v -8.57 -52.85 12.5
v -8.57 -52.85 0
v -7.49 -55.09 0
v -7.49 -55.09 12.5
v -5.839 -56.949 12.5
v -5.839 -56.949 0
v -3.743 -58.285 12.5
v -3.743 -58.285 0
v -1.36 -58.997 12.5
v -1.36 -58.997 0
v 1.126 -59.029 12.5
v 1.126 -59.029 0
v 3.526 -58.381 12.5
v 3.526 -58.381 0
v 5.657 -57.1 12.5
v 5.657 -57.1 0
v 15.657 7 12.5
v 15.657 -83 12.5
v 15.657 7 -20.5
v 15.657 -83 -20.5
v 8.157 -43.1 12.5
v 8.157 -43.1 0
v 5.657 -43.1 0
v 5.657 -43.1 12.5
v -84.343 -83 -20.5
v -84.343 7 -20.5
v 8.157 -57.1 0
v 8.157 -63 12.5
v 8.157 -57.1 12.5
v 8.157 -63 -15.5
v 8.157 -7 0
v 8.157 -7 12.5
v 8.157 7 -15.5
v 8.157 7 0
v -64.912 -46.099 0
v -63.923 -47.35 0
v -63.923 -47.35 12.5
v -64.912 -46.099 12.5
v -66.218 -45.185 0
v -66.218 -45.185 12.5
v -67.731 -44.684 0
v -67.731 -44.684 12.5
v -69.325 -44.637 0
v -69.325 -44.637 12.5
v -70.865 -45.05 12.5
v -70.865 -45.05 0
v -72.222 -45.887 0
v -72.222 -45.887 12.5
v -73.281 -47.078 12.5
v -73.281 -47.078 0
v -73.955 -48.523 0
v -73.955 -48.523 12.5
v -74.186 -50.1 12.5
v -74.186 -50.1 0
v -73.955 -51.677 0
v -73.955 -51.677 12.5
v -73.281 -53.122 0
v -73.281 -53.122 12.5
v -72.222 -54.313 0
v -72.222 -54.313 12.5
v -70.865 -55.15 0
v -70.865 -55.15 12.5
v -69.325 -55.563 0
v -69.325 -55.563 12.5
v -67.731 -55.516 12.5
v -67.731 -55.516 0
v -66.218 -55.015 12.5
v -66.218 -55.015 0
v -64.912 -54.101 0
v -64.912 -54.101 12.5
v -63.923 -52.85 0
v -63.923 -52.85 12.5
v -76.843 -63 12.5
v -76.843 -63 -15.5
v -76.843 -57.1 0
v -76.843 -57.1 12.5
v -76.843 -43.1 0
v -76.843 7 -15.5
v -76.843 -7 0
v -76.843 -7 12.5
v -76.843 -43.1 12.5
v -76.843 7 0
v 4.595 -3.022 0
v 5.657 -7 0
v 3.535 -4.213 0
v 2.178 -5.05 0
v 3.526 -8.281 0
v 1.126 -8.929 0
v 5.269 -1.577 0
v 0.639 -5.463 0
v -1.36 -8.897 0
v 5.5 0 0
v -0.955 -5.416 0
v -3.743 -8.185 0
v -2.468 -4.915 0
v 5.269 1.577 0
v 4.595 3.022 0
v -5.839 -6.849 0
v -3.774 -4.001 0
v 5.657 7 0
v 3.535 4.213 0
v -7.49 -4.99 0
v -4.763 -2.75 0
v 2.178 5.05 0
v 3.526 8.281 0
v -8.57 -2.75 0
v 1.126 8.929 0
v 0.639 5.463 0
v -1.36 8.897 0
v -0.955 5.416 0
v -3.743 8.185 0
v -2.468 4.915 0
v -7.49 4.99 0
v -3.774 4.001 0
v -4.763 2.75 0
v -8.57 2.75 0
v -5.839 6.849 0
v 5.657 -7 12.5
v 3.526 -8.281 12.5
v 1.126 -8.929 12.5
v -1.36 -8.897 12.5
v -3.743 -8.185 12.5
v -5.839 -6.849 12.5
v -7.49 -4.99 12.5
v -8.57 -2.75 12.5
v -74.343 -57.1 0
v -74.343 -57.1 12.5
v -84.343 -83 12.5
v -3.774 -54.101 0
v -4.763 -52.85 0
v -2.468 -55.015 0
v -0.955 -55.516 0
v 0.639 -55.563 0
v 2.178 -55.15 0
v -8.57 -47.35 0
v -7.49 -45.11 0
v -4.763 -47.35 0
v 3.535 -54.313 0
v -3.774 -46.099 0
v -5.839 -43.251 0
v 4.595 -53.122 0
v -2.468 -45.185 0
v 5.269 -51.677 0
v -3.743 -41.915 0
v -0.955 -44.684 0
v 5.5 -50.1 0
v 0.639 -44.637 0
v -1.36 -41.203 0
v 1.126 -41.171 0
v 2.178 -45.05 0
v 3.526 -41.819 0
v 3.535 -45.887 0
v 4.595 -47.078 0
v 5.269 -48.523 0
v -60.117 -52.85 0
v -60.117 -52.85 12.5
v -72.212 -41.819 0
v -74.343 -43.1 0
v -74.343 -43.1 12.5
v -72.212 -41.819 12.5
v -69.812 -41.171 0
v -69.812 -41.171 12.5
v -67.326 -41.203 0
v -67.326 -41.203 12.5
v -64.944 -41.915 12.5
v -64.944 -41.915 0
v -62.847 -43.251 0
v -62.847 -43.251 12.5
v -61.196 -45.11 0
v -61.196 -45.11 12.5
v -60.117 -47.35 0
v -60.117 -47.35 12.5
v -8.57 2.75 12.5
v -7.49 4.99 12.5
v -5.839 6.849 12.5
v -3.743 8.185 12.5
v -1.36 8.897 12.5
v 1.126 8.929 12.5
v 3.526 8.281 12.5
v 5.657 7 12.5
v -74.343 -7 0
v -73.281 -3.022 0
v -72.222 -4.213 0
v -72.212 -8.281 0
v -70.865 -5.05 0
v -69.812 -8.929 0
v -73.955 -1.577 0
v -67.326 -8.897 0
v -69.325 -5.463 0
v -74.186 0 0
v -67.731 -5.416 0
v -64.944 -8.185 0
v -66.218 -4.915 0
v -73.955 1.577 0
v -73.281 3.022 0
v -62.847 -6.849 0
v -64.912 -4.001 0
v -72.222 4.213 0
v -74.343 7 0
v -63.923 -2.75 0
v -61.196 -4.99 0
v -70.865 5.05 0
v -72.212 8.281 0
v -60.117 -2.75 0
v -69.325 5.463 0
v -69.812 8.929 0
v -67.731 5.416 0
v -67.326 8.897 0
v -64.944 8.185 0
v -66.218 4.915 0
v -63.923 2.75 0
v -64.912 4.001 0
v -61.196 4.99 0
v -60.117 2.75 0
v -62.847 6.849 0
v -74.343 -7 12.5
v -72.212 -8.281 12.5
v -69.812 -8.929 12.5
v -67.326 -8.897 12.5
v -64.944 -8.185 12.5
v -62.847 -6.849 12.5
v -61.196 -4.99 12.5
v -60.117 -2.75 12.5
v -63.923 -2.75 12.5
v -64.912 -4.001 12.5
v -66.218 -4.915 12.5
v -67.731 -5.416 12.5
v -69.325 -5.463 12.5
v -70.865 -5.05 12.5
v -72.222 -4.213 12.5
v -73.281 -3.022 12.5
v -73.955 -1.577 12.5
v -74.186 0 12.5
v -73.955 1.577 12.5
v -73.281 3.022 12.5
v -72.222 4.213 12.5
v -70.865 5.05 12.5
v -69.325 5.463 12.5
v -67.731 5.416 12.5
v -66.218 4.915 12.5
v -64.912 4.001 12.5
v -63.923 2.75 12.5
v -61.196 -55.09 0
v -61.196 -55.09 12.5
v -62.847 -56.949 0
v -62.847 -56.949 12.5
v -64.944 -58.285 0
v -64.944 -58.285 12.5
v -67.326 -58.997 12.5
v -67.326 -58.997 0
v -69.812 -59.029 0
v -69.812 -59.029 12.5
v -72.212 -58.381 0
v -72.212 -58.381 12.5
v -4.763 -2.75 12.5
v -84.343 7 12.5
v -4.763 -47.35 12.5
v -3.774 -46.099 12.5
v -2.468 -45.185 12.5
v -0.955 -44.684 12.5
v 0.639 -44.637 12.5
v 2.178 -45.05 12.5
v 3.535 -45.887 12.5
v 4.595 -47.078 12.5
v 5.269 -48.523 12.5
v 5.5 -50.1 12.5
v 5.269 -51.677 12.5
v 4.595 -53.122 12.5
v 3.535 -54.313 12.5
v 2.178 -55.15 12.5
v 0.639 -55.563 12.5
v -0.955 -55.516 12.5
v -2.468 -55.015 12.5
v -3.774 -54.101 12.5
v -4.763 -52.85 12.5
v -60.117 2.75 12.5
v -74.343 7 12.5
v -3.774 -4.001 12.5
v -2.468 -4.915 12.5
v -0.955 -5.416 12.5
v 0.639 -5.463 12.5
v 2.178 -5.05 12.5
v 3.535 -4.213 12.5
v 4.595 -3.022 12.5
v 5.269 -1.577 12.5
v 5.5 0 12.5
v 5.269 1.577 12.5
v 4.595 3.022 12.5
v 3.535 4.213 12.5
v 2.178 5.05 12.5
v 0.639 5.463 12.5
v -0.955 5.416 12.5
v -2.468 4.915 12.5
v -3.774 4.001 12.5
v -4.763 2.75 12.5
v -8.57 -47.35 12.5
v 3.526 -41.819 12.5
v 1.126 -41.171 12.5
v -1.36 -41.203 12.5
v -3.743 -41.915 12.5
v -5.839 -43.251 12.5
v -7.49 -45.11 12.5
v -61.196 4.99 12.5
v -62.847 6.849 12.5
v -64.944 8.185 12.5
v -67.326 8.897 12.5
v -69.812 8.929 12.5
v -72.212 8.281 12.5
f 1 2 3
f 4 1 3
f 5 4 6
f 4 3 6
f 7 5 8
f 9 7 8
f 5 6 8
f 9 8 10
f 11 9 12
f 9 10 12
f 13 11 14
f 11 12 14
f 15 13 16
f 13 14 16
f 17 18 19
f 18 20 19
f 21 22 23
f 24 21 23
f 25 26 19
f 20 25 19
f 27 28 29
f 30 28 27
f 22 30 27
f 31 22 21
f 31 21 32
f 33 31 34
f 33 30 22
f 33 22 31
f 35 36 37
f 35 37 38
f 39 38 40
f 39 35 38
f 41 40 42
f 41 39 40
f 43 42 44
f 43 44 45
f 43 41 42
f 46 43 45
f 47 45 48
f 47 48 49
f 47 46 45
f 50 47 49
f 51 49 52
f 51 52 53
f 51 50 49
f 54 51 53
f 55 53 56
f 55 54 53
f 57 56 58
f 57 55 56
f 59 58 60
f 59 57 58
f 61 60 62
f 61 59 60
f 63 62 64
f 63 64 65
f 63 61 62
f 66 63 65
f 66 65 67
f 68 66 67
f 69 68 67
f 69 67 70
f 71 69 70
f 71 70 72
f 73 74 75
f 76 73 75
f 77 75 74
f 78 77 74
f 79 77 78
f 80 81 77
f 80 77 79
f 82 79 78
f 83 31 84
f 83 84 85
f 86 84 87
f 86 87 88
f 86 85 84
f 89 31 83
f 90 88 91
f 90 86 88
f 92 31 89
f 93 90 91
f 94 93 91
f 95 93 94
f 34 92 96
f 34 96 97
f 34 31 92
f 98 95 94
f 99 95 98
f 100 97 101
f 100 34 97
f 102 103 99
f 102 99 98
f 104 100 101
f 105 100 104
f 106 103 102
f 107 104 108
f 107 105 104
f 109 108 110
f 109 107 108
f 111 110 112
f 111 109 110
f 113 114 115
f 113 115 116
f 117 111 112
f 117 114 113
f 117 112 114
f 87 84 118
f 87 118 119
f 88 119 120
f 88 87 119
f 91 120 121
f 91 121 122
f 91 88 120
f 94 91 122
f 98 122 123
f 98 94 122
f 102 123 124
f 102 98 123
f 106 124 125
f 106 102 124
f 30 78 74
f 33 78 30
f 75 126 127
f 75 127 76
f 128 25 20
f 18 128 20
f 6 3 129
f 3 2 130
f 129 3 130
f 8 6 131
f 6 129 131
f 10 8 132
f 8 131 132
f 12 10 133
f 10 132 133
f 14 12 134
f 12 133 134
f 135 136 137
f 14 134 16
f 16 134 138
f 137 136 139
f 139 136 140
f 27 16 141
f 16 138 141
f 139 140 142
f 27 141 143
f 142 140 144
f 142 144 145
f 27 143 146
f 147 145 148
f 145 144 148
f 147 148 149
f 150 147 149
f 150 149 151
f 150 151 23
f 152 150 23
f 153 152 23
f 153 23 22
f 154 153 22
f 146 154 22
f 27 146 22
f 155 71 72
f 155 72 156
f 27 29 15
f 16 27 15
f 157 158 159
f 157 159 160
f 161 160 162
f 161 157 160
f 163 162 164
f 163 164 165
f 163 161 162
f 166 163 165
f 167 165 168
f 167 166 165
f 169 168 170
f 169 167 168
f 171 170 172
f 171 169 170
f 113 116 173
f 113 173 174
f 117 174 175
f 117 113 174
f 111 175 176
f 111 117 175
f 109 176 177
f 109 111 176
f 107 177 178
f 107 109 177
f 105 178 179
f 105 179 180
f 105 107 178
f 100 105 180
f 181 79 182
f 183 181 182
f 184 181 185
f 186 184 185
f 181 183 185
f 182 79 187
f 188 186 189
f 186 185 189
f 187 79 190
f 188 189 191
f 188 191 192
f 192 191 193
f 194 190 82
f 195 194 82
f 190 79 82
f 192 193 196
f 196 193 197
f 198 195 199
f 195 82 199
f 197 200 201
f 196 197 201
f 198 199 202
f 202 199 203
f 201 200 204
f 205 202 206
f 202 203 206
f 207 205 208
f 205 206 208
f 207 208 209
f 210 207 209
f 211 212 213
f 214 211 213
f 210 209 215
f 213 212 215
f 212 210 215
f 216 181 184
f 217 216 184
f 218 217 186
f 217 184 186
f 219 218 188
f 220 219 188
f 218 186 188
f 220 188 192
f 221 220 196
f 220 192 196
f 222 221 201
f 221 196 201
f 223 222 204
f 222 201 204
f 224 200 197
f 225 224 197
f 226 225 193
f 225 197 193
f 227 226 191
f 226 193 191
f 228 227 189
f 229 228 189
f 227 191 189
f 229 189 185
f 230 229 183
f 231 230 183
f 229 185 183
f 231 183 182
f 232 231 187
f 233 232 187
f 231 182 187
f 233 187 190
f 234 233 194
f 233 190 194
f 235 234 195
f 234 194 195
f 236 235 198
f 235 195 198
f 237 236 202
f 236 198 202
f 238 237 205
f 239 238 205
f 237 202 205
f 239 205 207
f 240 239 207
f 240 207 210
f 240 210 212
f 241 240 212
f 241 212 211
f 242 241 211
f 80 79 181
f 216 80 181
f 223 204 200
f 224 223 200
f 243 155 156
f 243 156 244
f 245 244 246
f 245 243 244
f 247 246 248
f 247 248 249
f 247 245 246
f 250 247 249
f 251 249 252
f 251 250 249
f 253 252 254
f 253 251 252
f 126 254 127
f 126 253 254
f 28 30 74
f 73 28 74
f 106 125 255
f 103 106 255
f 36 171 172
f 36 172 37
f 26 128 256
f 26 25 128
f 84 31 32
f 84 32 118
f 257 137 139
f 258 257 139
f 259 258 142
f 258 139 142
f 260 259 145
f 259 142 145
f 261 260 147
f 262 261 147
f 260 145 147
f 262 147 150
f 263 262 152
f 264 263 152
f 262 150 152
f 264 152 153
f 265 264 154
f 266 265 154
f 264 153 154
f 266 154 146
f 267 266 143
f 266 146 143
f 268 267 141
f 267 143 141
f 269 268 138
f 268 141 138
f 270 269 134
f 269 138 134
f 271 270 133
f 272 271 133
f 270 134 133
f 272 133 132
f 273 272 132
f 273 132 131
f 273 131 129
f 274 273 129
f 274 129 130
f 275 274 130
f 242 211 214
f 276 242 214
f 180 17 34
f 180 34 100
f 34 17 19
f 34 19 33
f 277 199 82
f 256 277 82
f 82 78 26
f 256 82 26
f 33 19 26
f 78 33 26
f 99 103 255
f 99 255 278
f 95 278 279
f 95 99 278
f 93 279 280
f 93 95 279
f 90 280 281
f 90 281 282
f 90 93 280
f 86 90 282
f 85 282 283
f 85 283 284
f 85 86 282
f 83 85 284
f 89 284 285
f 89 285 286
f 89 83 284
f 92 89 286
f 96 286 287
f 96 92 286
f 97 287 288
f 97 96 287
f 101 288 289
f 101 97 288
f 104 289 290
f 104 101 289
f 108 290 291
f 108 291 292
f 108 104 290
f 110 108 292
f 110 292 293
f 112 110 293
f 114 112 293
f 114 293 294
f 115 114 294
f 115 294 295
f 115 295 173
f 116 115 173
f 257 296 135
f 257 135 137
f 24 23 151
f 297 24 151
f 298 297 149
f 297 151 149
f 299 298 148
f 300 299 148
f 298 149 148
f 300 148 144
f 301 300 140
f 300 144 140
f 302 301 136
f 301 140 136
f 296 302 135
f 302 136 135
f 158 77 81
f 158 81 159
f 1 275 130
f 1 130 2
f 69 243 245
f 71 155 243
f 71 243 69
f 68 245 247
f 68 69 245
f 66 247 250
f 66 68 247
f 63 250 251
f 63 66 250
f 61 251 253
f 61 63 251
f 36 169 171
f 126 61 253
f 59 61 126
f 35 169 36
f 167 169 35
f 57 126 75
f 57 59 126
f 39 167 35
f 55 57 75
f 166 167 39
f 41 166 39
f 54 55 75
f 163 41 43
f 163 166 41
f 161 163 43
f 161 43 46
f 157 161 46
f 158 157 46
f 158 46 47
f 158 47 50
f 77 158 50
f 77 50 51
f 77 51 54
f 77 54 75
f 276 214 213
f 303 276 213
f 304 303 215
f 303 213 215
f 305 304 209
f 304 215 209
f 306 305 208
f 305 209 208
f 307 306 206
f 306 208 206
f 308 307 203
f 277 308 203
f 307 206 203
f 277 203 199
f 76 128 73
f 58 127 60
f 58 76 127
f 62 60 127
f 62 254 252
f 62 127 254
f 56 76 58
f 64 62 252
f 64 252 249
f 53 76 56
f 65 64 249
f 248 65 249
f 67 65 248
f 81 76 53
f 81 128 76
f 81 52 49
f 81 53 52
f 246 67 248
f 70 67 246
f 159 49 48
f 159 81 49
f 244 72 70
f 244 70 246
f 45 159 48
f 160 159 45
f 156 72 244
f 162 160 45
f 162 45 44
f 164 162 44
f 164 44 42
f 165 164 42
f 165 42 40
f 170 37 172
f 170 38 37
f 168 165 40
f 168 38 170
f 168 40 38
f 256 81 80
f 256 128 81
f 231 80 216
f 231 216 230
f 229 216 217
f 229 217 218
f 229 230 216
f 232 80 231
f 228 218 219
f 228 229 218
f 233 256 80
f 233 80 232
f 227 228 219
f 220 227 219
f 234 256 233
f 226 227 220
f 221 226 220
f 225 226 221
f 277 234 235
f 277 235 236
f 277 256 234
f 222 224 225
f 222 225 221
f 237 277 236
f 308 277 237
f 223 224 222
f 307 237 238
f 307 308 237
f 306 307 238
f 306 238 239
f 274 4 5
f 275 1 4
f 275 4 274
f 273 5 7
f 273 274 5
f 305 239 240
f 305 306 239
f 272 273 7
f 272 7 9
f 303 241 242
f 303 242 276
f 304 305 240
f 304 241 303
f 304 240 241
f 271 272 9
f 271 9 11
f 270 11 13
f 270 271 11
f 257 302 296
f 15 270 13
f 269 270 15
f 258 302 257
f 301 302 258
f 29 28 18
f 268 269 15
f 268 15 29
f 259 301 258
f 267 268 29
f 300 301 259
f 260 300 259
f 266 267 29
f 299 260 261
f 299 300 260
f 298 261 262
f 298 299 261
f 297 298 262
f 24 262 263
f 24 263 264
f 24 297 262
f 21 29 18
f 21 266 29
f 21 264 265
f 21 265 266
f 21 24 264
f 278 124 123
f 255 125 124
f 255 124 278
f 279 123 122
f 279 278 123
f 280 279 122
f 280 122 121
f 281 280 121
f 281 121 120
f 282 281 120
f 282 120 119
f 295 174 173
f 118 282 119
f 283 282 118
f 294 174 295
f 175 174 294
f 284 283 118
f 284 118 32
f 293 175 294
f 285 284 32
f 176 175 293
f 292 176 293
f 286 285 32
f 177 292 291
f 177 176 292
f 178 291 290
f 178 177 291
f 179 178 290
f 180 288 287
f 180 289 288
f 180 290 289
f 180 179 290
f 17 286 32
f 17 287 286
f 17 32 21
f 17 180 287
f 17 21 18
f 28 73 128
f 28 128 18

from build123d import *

# Parameters (mm, degrees)
RESSALTO_EXTRUS_O2_DEPTH   = 12.5
RESSALTO_EXTRUS_O2_2_DEPTH = 12.5
ESBO_O2_W                  = 7.5
ESBO_O2_H                  = 64.1
RESSALTO_EXTRUS_O3_DEPTH   = 28
ESBO_O3_W                  = 50
ESBO_O3_H                  = 90
RESSALTO_EXTRUS_O4_DEPTH   = 5
RESSALTO_EXTRUS_O5_DEPTH   = 28


with BuildPart() as part:
    # Esboço1 → Ressalto-extrusão2 (new body)
    with BuildSketch(Plane.XY):
        with BuildLine():
            Line((-4.763139721, 2.75), (-8.569568251, 2.75))
            ThreePointArc((-8.569568251, 2.75), (-2.576160071, 8.623421553), (5.656854249, 7))
            Line((5.656854249, 7), (15.656854249, 7))
            Line((15.656854249, 7), (15.656854249, -7))
            Line((15.656854249, -7), (5.656854249, -7))
            ThreePointArc((5.656854249, -7), (-2.576160071, -8.623421553), (-8.569568251, -2.75))
            Line((-8.569568251, -2.75), (-4.763139721, -2.75))
            ThreePointArc((-4.763139721, -2.75), (5.5, 0), (-4.763139721, 2.75))
        make_face()
    ressalto_extrus_o2 = extrude(amount=RESSALTO_EXTRUS_O2_DEPTH)



with BuildPart() as body_2:
    # Esboço1 → Ressalto-extrus_o2 2 (new body)
    with BuildSketch(Plane.XY):
        with BuildLine():
            Line((15.656854249, -57.1), (15.656854249, -43.1))
            Line((15.656854249, -43.1), (5.656854249, -43.1))
            ThreePointArc((5.656854249, -43.1), (-2.576160071, -41.476578447), (-8.569568251, -47.35))
            Line((-8.569568251, -47.35), (-4.763139721, -47.35))
            ThreePointArc((-4.763139721, -47.35), (5.5, -50.1), (-4.763139721, -52.85))
            Line((-4.763139721, -52.85), (-8.569568251, -52.85))
            ThreePointArc((-8.569568251, -52.85), (-2.576160071, -58.723421553), (5.656854249, -57.1))
            Line((5.656854249, -57.1), (15.656854249, -57.1))
        make_face()
    ressalto_extrus_o2_2 = extrude(amount=RESSALTO_EXTRUS_O2_2_DEPTH)


with BuildPart() as part_1:
    add(part.part)

    add(body_2.part)  # Ressalto-extrusão3 merges body 2
    # Esboço2 → Ressalto-extrusão3 (add)
    with BuildSketch(Plane(origin=(0, 0, 12.5), x_dir=(-1, 0, 0), z_dir=(0, 0, -1))):
        with Locations((-11.906854249, -25.05)):
            Rectangle(ESBO_O2_W, ESBO_O2_H)
    ressalto_extrus_o3 = extrude(amount=RESSALTO_EXTRUS_O3_DEPTH)

    # Esboço3 → Ressalto-extrusão4 (add)
    with BuildSketch(Plane(origin=(0, 0, -15.5), x_dir=(-1, 0, 0), z_dir=(0, 0, -1))):
        with Locations((9.343145751, -38)):
            Rectangle(ESBO_O3_W, ESBO_O3_H)
    ressalto_extrus_o4 = extrude(amount=RESSALTO_EXTRUS_O4_DEPTH)

    # Esboço4 → Ressalto-extrusão5 (add)
    with BuildSketch(Plane.XY.offset(-15.5)):
        Polygon((15.656854249, -83), (-34.343145751, -83), (-34.343145751, -63), (8.156854249, -63), (8.156854249, -57.1), (15.656854249, -57.1), (15.656854249, -63), align=None)
    ressalto_extrus_o5 = extrude(amount=RESSALTO_EXTRUS_O5_DEPTH)

    # Espelhar4: Ressalto-extrusão4, Ressalto-extrusão5 across plane
    add(ressalto_extrus_o4.mirror(Plane(origin=(-34.343145751, 0, 0), x_dir=(0, 0, 1), z_dir=(1, 0, 0))))
    add(ressalto_extrus_o5.mirror(Plane(origin=(-34.343145751, 0, 0), x_dir=(0, 0, 1), z_dir=(1, 0, 0))))

    # Espelhar5: Ressalto-extrusão3 across plane
    add(ressalto_extrus_o3.mirror(Plane(origin=(-34.343145751, 0, 0), x_dir=(0, 0, 1), z_dir=(1, 0, 0))))

    # Espelhar6: Ressalto-extrusão2, Ressalto-extrus_o2 2 across plane
    add(ressalto_extrus_o2.mirror(Plane(origin=(-34.343145751, 0, 0), x_dir=(0, 0, 1), z_dir=(1, 0, 0))))
    add(ressalto_extrus_o2_2.mirror(Plane(origin=(-34.343145751, 0, 0), x_dir=(0, 0, 1), z_dir=(1, 0, 0))))


solid = part_1.part
